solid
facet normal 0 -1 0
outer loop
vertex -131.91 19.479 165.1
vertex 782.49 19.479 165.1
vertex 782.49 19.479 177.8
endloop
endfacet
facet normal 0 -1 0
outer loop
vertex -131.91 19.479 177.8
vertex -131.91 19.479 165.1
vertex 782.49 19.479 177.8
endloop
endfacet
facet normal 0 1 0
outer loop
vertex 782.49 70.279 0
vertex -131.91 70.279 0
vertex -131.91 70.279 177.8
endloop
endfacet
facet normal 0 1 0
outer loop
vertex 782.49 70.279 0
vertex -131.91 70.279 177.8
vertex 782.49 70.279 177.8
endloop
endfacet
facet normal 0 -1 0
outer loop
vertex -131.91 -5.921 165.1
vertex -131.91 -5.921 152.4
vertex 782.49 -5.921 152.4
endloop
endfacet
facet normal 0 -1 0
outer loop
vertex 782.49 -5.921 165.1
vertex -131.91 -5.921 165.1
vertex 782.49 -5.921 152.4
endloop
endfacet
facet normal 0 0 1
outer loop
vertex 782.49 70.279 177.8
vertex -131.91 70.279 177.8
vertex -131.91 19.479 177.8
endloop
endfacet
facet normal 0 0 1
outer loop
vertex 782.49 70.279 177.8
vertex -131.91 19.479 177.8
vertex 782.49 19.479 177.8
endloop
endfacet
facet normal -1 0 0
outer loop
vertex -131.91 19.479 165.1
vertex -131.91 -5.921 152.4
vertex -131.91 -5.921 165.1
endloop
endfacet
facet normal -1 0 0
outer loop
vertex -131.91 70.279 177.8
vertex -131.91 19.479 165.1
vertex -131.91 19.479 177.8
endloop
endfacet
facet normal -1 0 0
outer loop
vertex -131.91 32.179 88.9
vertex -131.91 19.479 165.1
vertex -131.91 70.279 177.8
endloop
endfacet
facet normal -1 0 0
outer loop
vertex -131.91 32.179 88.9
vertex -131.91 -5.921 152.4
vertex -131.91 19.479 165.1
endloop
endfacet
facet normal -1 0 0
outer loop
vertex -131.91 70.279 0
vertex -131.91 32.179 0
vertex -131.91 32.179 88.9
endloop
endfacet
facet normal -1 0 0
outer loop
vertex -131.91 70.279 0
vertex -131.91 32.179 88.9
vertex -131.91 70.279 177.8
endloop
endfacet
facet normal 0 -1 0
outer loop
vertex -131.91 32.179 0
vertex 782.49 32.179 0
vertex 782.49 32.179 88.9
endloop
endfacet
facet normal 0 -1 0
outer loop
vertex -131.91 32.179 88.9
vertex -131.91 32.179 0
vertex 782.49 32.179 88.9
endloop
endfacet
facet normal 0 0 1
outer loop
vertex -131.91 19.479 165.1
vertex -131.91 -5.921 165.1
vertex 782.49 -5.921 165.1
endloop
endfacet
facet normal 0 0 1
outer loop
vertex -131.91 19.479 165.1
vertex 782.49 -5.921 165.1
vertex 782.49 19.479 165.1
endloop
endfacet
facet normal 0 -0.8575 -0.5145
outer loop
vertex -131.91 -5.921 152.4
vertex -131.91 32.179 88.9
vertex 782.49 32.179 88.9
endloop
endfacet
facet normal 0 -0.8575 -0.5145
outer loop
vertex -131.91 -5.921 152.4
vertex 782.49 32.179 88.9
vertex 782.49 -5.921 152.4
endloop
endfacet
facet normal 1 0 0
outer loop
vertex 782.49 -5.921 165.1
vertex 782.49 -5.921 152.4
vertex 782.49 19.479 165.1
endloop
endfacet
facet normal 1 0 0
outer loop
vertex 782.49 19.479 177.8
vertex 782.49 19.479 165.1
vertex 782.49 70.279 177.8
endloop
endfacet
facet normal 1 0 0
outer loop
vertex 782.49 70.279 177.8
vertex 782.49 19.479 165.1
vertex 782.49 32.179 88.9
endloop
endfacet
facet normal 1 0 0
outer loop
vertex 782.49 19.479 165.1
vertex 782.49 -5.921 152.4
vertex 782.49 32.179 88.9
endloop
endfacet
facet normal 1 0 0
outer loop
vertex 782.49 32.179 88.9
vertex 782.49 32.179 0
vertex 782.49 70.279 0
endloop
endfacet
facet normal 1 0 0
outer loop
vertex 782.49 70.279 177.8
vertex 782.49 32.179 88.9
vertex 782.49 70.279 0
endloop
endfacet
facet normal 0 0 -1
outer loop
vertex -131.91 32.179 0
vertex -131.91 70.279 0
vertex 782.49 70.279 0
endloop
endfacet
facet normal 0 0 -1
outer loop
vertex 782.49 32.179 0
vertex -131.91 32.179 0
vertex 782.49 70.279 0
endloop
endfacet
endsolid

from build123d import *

# Parameters (mm, degrees)
F0_W     = 914.4
F0_H     = 76.2
F1_DEPTH = 177.8
F3_DEPTH = 2133.6
F4_W     = 25.4
F4_H     = 12.7
F5_DEPTH = 2438.4


with BuildPart() as f1:
    # F0 (on Top) → F1 (new body)
    with BuildSketch(Plane.XY):
        with Locations((325.290451, 32.179302)):
            Rectangle(F0_W, F0_H)
    extrude(amount=F1_DEPTH)

    # F2 (on face) → F3 (cut)
    with BuildSketch(Plane.YZ.offset(782.490451)):
        Polygon((32.179302, 88.9), (-5.920698, 152.4), (-5.920698, 0), (32.179302, 0), align=None)
    extrude(amount=-F3_DEPTH, mode=Mode.SUBTRACT)

    # F4 (on face) → F5 (cut)
    with BuildSketch(Plane.YZ.offset(782.490451)):
        with Locations((6.779302, 171.45)):
            Rectangle(F4_W, F4_H)
    extrude(amount=-F5_DEPTH, mode=Mode.SUBTRACT)


solid = f1.part
